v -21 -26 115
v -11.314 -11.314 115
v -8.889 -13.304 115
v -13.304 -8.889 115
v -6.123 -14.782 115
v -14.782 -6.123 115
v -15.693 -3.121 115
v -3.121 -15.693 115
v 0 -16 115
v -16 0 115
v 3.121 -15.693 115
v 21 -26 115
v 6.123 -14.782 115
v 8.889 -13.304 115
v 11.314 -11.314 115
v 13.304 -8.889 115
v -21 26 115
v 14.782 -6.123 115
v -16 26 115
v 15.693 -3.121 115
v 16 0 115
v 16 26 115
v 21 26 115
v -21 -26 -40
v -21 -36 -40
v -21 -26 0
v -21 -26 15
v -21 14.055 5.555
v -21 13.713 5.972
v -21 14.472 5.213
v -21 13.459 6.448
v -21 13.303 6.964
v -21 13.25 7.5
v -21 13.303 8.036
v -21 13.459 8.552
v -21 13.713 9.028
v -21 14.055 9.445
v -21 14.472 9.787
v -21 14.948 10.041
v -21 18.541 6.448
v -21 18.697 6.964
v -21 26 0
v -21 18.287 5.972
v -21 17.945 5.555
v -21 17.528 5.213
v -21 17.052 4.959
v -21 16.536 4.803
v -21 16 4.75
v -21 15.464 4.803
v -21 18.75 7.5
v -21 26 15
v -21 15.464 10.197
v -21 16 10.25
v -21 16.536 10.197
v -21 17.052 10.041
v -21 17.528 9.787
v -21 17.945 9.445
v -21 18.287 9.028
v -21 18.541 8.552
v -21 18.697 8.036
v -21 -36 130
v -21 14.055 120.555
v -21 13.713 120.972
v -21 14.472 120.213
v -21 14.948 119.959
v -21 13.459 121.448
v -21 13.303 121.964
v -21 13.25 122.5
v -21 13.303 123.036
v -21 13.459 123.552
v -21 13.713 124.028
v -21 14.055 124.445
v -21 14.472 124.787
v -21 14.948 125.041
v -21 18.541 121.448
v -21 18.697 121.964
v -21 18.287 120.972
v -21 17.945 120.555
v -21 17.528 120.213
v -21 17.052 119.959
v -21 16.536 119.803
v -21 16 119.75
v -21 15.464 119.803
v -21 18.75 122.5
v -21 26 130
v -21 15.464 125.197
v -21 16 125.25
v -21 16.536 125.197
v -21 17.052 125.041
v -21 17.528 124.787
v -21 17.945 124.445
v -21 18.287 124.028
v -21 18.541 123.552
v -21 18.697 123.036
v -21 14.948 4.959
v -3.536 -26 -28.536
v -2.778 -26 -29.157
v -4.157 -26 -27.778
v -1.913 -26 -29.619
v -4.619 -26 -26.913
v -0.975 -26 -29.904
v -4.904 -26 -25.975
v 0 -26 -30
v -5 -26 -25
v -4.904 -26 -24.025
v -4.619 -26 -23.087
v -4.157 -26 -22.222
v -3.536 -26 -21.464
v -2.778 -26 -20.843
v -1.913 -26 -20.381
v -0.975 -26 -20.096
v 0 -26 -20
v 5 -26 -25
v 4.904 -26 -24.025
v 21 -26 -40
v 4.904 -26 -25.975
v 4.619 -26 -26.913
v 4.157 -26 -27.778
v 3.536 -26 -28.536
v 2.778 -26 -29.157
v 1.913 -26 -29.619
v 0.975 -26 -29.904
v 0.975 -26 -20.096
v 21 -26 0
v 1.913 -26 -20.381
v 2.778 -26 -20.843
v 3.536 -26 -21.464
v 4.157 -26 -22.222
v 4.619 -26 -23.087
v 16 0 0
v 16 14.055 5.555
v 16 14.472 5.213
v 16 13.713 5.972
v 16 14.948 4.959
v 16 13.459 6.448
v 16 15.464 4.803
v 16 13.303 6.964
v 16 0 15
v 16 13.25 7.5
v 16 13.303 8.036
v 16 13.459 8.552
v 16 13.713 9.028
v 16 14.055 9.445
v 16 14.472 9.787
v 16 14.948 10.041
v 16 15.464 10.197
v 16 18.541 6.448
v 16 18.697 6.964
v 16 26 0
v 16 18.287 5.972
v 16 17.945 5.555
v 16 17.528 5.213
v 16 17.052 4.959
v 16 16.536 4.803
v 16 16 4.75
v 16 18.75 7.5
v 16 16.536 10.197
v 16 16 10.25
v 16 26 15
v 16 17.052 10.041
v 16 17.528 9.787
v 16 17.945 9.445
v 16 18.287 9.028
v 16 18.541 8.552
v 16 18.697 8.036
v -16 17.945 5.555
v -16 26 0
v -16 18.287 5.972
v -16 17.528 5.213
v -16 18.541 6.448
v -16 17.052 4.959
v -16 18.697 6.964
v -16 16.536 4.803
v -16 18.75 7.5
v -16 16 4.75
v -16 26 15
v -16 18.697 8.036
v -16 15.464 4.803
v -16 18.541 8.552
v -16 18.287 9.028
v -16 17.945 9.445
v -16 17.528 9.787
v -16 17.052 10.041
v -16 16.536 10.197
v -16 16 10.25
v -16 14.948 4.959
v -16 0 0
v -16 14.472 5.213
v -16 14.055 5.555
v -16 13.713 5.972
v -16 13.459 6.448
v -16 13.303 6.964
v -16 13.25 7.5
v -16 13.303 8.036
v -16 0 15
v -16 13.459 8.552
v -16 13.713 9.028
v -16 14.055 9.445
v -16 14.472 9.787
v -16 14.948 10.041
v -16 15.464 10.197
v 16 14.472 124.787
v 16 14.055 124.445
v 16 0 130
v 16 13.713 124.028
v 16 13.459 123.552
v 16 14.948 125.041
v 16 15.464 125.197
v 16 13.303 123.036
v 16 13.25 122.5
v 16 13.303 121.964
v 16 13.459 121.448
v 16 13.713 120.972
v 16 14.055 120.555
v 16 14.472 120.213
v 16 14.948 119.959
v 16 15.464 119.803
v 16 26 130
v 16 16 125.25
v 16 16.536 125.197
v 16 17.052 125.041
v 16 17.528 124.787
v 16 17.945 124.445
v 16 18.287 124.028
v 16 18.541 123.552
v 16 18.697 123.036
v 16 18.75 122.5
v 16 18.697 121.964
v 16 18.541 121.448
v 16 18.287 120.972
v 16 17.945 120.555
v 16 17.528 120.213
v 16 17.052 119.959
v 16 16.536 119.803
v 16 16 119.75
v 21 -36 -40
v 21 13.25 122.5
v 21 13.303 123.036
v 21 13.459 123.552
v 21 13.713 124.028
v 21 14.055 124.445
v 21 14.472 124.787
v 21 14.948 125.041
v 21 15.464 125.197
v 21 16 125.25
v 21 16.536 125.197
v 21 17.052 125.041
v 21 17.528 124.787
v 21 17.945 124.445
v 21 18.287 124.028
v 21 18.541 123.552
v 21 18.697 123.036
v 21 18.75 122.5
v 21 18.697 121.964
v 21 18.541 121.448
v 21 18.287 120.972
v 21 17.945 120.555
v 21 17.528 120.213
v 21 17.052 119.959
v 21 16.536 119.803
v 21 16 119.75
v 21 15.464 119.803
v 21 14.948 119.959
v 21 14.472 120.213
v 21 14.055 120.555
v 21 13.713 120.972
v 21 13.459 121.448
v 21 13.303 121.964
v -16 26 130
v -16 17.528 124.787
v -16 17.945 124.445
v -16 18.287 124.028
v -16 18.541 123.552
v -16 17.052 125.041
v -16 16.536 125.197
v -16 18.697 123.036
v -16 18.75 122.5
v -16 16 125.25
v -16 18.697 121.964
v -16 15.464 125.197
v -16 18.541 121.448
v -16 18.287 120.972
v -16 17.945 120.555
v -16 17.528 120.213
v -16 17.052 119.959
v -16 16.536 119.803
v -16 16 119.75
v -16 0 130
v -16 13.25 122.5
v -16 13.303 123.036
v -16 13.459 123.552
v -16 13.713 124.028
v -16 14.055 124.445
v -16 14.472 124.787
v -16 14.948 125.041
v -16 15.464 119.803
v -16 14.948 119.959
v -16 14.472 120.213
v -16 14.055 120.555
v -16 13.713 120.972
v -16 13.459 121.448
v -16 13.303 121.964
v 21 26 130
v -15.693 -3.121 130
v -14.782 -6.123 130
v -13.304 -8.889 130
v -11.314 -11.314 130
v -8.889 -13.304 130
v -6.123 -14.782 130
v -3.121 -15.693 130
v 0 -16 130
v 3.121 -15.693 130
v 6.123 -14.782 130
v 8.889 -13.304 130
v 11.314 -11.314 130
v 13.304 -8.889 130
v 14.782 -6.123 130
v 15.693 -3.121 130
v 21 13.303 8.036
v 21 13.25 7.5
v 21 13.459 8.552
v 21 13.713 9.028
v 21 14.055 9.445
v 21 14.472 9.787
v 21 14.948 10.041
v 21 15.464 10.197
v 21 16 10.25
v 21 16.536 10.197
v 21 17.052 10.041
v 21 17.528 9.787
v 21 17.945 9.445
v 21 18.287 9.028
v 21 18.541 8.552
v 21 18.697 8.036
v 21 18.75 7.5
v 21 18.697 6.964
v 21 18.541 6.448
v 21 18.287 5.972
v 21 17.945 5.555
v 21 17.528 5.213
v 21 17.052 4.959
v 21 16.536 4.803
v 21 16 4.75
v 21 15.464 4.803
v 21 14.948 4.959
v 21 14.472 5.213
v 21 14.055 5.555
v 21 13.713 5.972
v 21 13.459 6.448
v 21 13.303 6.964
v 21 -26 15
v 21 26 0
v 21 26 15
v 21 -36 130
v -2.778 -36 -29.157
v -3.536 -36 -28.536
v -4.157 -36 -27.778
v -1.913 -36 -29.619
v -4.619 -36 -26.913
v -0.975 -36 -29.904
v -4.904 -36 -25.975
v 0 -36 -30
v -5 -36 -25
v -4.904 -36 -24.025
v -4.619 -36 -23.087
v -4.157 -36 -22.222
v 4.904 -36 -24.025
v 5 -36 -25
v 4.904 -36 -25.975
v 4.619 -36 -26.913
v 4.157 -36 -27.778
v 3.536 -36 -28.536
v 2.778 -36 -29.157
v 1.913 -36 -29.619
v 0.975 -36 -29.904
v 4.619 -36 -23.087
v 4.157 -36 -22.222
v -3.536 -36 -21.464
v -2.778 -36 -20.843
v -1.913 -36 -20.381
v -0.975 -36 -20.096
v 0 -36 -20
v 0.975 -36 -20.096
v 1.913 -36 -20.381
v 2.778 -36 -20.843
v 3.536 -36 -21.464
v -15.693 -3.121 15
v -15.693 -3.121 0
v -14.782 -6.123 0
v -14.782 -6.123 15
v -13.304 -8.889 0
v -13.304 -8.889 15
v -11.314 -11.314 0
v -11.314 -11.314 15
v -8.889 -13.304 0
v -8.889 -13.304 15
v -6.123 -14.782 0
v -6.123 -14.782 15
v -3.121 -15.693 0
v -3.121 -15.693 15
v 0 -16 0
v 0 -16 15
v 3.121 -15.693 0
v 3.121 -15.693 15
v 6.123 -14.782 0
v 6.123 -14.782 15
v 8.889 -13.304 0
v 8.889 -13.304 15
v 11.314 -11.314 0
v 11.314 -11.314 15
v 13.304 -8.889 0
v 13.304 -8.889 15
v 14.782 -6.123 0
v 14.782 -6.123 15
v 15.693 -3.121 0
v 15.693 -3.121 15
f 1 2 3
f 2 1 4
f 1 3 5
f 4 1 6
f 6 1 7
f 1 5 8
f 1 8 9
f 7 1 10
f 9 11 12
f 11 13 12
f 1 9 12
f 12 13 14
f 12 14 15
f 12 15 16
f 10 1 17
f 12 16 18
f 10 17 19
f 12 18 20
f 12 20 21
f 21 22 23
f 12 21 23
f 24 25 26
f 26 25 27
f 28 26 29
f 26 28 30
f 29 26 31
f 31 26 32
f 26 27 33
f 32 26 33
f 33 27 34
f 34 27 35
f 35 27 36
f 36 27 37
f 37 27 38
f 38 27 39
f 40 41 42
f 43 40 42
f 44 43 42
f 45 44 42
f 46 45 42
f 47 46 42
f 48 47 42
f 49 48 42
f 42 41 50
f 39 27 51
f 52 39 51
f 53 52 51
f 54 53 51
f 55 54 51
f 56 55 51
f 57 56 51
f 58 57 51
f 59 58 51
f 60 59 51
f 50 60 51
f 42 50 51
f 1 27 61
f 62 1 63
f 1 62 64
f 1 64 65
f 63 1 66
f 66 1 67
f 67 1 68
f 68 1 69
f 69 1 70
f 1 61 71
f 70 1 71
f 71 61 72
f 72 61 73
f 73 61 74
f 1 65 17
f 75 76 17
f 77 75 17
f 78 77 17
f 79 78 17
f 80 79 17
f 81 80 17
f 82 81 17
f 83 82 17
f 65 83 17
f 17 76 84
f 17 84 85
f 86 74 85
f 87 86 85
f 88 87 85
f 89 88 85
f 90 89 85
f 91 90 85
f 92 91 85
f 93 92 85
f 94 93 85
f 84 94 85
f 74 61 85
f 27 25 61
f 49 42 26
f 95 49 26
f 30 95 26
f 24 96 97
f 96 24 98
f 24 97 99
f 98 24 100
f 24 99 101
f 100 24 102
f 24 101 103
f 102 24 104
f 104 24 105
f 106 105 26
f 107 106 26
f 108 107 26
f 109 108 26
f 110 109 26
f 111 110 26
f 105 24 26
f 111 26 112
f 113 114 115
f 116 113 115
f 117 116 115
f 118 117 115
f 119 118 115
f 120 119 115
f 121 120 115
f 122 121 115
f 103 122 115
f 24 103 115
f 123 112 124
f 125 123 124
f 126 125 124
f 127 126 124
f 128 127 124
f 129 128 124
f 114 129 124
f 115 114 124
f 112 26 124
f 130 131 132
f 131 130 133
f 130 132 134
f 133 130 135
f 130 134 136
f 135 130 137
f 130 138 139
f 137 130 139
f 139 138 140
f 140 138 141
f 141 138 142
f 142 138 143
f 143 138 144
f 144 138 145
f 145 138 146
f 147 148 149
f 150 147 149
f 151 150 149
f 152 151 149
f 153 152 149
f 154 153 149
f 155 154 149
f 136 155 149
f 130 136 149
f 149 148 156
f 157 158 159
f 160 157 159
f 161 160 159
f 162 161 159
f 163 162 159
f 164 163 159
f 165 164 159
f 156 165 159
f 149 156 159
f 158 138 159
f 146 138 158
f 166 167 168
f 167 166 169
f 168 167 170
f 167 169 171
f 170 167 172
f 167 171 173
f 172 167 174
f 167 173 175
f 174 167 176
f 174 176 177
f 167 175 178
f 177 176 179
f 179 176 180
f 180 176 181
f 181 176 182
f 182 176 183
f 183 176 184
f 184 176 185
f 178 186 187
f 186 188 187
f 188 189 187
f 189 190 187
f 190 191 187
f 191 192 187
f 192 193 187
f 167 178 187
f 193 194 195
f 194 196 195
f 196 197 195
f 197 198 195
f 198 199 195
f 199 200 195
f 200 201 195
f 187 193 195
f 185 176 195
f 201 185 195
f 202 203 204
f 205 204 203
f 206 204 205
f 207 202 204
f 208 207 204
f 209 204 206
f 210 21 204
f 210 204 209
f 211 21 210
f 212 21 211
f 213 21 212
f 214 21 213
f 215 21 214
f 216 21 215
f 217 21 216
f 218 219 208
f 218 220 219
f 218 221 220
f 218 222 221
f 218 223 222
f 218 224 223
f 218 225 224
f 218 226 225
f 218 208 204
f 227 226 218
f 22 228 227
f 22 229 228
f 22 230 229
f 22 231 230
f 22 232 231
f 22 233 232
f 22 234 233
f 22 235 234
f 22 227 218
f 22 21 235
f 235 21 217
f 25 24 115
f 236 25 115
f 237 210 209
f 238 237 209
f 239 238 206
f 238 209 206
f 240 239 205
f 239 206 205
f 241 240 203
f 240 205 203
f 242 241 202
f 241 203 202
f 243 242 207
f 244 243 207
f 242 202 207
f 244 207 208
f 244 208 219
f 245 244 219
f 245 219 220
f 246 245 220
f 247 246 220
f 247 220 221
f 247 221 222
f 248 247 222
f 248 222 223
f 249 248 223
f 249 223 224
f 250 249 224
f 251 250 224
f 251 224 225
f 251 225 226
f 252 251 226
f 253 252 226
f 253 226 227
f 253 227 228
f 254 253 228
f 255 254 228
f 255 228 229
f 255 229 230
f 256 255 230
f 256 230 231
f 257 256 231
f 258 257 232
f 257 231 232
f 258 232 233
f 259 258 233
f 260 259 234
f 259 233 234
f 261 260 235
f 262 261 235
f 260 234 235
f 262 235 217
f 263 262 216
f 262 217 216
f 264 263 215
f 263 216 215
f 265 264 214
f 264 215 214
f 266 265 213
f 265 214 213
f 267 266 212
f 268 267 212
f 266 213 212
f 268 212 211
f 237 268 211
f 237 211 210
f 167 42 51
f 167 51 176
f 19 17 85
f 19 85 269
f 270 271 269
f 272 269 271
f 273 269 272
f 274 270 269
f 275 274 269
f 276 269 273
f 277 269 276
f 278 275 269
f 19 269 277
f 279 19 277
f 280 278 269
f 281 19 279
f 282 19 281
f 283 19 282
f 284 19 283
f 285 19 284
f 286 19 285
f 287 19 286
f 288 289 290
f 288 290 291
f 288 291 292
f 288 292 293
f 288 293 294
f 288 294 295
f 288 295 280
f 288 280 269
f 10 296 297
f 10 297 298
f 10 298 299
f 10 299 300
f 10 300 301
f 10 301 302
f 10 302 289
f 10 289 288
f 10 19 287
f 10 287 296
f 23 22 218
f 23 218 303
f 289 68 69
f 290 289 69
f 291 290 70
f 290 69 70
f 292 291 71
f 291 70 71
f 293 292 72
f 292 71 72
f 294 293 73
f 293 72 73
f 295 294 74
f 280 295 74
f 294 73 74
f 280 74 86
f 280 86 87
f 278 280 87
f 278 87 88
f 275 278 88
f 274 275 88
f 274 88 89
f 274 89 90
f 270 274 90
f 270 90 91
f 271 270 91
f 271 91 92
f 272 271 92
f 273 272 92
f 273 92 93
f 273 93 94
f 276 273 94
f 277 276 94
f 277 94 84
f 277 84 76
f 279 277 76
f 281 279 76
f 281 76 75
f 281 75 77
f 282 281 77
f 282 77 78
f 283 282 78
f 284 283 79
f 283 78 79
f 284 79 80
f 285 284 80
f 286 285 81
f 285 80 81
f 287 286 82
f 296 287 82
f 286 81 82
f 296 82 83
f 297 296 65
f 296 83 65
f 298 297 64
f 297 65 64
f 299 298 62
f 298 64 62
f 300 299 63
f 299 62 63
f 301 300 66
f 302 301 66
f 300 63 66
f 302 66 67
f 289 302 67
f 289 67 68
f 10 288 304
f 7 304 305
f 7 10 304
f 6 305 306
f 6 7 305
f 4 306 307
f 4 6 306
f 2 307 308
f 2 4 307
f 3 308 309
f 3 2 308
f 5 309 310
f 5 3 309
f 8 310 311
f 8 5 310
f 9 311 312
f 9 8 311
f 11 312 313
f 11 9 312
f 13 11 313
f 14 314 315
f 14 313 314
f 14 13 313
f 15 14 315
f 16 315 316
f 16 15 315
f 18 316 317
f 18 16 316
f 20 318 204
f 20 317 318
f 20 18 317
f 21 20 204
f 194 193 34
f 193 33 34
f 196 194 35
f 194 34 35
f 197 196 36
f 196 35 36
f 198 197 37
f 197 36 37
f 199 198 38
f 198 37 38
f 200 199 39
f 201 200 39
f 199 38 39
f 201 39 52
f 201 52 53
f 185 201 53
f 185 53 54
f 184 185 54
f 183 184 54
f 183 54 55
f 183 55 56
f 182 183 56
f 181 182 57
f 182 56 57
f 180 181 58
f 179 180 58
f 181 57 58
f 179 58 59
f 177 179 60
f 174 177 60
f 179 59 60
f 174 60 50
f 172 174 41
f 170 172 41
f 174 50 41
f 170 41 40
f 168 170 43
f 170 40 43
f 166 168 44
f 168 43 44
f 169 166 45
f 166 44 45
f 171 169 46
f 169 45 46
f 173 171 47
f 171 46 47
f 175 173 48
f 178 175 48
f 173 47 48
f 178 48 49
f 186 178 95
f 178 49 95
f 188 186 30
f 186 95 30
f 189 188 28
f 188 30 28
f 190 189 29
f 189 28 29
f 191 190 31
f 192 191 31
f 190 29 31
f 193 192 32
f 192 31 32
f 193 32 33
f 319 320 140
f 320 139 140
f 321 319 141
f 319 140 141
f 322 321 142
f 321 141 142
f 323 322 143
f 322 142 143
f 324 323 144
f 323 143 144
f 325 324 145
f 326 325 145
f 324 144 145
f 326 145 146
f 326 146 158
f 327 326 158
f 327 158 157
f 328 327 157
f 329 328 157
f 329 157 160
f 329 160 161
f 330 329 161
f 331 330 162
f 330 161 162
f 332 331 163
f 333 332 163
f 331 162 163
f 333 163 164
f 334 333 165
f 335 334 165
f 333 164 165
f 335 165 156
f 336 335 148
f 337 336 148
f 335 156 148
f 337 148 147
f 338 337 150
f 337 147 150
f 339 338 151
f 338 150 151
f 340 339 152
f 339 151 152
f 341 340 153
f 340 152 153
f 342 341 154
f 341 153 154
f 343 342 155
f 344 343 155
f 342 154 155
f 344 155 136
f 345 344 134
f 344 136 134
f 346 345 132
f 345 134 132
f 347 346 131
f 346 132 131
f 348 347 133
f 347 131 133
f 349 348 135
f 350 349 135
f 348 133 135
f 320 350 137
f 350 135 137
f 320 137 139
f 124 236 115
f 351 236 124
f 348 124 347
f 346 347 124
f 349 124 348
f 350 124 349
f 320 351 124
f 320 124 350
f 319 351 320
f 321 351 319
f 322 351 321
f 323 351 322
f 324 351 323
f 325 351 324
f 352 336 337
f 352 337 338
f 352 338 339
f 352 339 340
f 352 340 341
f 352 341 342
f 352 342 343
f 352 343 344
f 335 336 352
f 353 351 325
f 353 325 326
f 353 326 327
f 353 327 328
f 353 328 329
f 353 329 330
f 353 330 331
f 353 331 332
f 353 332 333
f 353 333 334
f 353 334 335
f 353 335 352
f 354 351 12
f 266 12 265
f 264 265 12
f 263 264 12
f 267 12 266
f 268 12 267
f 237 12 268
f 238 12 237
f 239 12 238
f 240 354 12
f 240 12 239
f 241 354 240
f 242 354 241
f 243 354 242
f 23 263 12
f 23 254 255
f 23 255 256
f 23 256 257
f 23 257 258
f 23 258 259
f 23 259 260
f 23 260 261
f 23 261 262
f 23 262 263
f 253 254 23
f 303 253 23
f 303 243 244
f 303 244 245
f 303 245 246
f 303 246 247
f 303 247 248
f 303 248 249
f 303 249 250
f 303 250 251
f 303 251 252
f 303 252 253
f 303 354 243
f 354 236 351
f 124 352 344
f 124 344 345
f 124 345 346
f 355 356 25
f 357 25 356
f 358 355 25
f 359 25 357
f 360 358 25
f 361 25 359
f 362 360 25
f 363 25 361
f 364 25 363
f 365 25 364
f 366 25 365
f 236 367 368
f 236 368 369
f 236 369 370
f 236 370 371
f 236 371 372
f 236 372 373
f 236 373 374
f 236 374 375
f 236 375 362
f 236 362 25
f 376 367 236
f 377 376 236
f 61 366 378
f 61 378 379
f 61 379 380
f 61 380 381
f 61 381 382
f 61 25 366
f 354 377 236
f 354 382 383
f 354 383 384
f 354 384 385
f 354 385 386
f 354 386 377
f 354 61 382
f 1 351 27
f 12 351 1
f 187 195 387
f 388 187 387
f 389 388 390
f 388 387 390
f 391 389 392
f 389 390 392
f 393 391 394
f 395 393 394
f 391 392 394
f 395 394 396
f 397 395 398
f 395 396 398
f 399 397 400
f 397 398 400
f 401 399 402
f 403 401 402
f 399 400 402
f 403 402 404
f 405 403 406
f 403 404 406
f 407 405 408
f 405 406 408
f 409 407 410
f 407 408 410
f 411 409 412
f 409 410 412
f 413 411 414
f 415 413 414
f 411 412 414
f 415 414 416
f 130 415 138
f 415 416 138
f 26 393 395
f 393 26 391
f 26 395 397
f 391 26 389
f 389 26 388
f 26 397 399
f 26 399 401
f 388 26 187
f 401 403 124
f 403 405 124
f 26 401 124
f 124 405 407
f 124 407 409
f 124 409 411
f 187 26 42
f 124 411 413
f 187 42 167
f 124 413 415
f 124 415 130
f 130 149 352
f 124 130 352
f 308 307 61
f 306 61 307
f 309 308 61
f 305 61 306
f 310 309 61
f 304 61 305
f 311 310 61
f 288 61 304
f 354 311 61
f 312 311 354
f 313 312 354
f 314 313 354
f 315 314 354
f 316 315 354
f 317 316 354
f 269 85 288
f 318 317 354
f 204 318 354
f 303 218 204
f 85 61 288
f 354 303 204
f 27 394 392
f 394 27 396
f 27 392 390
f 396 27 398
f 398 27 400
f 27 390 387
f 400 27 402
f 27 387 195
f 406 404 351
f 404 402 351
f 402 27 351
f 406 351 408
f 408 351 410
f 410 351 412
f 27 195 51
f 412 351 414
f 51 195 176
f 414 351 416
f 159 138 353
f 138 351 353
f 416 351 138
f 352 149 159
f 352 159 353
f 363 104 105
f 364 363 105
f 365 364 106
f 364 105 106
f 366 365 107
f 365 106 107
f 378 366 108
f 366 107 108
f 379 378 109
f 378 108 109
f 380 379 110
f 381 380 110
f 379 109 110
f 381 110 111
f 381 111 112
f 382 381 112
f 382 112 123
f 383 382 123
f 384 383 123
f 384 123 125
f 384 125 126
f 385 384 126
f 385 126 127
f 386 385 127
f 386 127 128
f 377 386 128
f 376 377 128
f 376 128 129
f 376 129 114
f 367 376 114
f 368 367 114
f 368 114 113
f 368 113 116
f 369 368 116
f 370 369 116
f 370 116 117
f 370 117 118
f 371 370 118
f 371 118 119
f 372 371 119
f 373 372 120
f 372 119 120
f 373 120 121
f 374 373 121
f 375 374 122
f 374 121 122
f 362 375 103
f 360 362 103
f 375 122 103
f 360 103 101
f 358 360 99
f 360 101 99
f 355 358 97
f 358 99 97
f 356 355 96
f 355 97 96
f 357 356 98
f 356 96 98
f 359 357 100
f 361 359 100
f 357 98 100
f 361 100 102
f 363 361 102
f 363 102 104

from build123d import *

# Parameters (mm, degrees)
F0_W      = 42
F0_H      = 52
F1_DEPTH  = 15
F3_DEPTH  = 50
F4_W      = 42
F4_H      = 10
F5_DEPTH  = 100
F6_W      = 42
F6_H      = 52
F7_DEPTH  = 15
F8_DEPTH  = 200
F9_W      = 42
F9_H      = 10
F10_DEPTH = 170
F11_R     = 5
F12_DEPTH = 25
F13_R     = 2.75
F14_DEPTH = 100
F15_W     = 10
F15_H     = 100
F16_DEPTH = 60


with BuildPart() as f1:
    # F0 (on Top) → F1 (new body)
    with BuildSketch(Plane.XY):
        Rectangle(F0_W, F0_H)
    extrude(amount=F1_DEPTH)

    # F2 (on face) → F3 (cut)
    with BuildSketch(Plane.XY.offset(15)):
        with BuildLine():
            Line((-16, 26), (-16, 0))
            ThreePointArc((-16, 0), (0, -16), (16, 0))
            Line((16, 0), (16, 26))
            Line((16, 26), (-16, 26))
        make_face()
    extrude(amount=-F3_DEPTH, mode=Mode.SUBTRACT)

    # F4 (on face) → F5 (join)
    with BuildSketch(Plane.XY.offset(15)):
        with Locations((0, -21)):
            Rectangle(F4_W, F4_H)
    extrude(amount=F5_DEPTH)

    # F6 (on face) → F7 (join)
    with BuildSketch(Plane.XY.offset(115)):
        Rectangle(F6_W, F6_H)
    extrude(amount=F7_DEPTH)

    # F2 (on face) → F8 (cut)
    with BuildSketch(Plane.XY.offset(15)):
        with BuildLine():
            Line((-16, 26), (-16, 0))
            ThreePointArc((-16, 0), (0, -16), (16, 0))
            Line((16, 0), (16, 26))
            Line((16, 26), (-16, 26))
        make_face()
    extrude(amount=F8_DEPTH, mode=Mode.SUBTRACT)

    # F9 (on face) → F10 (join)
    with BuildSketch(Plane.XY.offset(130)):
        with Locations((0, -31)):
            Rectangle(F9_W, F9_H)
    extrude(amount=-F10_DEPTH)

    # F11 (on face) → F12 (cut)
    with BuildSketch(Plane(origin=(0, -26, 0), x_dir=(-1, 0, 0), z_dir=(0, 1, 0))):
        with Locations((0, -25)):
            Circle(F11_R)
    extrude(amount=-F12_DEPTH, mode=Mode.SUBTRACT)

    # F13 (on face) → F14 (cut, symmetric)
    with BuildSketch(Plane(origin=(-21, 0, 0), x_dir=(0, -1, 0), z_dir=(-1, 0, 0))):
        with Locations((-16, 122.5)):
            Circle(F13_R)
        with Locations((-16, 7.5)):
            Circle(F13_R)
    extrude(amount=F14_DEPTH, both=True, mode=Mode.SUBTRACT)

    # F15 (on face) → F16 (cut)
    with BuildSketch(Plane.YZ.offset(21)):
        with Locations((-21, 65)):
            Rectangle(F15_W, F15_H)
    extrude(amount=-F16_DEPTH, mode=Mode.SUBTRACT)


solid = f1.part
